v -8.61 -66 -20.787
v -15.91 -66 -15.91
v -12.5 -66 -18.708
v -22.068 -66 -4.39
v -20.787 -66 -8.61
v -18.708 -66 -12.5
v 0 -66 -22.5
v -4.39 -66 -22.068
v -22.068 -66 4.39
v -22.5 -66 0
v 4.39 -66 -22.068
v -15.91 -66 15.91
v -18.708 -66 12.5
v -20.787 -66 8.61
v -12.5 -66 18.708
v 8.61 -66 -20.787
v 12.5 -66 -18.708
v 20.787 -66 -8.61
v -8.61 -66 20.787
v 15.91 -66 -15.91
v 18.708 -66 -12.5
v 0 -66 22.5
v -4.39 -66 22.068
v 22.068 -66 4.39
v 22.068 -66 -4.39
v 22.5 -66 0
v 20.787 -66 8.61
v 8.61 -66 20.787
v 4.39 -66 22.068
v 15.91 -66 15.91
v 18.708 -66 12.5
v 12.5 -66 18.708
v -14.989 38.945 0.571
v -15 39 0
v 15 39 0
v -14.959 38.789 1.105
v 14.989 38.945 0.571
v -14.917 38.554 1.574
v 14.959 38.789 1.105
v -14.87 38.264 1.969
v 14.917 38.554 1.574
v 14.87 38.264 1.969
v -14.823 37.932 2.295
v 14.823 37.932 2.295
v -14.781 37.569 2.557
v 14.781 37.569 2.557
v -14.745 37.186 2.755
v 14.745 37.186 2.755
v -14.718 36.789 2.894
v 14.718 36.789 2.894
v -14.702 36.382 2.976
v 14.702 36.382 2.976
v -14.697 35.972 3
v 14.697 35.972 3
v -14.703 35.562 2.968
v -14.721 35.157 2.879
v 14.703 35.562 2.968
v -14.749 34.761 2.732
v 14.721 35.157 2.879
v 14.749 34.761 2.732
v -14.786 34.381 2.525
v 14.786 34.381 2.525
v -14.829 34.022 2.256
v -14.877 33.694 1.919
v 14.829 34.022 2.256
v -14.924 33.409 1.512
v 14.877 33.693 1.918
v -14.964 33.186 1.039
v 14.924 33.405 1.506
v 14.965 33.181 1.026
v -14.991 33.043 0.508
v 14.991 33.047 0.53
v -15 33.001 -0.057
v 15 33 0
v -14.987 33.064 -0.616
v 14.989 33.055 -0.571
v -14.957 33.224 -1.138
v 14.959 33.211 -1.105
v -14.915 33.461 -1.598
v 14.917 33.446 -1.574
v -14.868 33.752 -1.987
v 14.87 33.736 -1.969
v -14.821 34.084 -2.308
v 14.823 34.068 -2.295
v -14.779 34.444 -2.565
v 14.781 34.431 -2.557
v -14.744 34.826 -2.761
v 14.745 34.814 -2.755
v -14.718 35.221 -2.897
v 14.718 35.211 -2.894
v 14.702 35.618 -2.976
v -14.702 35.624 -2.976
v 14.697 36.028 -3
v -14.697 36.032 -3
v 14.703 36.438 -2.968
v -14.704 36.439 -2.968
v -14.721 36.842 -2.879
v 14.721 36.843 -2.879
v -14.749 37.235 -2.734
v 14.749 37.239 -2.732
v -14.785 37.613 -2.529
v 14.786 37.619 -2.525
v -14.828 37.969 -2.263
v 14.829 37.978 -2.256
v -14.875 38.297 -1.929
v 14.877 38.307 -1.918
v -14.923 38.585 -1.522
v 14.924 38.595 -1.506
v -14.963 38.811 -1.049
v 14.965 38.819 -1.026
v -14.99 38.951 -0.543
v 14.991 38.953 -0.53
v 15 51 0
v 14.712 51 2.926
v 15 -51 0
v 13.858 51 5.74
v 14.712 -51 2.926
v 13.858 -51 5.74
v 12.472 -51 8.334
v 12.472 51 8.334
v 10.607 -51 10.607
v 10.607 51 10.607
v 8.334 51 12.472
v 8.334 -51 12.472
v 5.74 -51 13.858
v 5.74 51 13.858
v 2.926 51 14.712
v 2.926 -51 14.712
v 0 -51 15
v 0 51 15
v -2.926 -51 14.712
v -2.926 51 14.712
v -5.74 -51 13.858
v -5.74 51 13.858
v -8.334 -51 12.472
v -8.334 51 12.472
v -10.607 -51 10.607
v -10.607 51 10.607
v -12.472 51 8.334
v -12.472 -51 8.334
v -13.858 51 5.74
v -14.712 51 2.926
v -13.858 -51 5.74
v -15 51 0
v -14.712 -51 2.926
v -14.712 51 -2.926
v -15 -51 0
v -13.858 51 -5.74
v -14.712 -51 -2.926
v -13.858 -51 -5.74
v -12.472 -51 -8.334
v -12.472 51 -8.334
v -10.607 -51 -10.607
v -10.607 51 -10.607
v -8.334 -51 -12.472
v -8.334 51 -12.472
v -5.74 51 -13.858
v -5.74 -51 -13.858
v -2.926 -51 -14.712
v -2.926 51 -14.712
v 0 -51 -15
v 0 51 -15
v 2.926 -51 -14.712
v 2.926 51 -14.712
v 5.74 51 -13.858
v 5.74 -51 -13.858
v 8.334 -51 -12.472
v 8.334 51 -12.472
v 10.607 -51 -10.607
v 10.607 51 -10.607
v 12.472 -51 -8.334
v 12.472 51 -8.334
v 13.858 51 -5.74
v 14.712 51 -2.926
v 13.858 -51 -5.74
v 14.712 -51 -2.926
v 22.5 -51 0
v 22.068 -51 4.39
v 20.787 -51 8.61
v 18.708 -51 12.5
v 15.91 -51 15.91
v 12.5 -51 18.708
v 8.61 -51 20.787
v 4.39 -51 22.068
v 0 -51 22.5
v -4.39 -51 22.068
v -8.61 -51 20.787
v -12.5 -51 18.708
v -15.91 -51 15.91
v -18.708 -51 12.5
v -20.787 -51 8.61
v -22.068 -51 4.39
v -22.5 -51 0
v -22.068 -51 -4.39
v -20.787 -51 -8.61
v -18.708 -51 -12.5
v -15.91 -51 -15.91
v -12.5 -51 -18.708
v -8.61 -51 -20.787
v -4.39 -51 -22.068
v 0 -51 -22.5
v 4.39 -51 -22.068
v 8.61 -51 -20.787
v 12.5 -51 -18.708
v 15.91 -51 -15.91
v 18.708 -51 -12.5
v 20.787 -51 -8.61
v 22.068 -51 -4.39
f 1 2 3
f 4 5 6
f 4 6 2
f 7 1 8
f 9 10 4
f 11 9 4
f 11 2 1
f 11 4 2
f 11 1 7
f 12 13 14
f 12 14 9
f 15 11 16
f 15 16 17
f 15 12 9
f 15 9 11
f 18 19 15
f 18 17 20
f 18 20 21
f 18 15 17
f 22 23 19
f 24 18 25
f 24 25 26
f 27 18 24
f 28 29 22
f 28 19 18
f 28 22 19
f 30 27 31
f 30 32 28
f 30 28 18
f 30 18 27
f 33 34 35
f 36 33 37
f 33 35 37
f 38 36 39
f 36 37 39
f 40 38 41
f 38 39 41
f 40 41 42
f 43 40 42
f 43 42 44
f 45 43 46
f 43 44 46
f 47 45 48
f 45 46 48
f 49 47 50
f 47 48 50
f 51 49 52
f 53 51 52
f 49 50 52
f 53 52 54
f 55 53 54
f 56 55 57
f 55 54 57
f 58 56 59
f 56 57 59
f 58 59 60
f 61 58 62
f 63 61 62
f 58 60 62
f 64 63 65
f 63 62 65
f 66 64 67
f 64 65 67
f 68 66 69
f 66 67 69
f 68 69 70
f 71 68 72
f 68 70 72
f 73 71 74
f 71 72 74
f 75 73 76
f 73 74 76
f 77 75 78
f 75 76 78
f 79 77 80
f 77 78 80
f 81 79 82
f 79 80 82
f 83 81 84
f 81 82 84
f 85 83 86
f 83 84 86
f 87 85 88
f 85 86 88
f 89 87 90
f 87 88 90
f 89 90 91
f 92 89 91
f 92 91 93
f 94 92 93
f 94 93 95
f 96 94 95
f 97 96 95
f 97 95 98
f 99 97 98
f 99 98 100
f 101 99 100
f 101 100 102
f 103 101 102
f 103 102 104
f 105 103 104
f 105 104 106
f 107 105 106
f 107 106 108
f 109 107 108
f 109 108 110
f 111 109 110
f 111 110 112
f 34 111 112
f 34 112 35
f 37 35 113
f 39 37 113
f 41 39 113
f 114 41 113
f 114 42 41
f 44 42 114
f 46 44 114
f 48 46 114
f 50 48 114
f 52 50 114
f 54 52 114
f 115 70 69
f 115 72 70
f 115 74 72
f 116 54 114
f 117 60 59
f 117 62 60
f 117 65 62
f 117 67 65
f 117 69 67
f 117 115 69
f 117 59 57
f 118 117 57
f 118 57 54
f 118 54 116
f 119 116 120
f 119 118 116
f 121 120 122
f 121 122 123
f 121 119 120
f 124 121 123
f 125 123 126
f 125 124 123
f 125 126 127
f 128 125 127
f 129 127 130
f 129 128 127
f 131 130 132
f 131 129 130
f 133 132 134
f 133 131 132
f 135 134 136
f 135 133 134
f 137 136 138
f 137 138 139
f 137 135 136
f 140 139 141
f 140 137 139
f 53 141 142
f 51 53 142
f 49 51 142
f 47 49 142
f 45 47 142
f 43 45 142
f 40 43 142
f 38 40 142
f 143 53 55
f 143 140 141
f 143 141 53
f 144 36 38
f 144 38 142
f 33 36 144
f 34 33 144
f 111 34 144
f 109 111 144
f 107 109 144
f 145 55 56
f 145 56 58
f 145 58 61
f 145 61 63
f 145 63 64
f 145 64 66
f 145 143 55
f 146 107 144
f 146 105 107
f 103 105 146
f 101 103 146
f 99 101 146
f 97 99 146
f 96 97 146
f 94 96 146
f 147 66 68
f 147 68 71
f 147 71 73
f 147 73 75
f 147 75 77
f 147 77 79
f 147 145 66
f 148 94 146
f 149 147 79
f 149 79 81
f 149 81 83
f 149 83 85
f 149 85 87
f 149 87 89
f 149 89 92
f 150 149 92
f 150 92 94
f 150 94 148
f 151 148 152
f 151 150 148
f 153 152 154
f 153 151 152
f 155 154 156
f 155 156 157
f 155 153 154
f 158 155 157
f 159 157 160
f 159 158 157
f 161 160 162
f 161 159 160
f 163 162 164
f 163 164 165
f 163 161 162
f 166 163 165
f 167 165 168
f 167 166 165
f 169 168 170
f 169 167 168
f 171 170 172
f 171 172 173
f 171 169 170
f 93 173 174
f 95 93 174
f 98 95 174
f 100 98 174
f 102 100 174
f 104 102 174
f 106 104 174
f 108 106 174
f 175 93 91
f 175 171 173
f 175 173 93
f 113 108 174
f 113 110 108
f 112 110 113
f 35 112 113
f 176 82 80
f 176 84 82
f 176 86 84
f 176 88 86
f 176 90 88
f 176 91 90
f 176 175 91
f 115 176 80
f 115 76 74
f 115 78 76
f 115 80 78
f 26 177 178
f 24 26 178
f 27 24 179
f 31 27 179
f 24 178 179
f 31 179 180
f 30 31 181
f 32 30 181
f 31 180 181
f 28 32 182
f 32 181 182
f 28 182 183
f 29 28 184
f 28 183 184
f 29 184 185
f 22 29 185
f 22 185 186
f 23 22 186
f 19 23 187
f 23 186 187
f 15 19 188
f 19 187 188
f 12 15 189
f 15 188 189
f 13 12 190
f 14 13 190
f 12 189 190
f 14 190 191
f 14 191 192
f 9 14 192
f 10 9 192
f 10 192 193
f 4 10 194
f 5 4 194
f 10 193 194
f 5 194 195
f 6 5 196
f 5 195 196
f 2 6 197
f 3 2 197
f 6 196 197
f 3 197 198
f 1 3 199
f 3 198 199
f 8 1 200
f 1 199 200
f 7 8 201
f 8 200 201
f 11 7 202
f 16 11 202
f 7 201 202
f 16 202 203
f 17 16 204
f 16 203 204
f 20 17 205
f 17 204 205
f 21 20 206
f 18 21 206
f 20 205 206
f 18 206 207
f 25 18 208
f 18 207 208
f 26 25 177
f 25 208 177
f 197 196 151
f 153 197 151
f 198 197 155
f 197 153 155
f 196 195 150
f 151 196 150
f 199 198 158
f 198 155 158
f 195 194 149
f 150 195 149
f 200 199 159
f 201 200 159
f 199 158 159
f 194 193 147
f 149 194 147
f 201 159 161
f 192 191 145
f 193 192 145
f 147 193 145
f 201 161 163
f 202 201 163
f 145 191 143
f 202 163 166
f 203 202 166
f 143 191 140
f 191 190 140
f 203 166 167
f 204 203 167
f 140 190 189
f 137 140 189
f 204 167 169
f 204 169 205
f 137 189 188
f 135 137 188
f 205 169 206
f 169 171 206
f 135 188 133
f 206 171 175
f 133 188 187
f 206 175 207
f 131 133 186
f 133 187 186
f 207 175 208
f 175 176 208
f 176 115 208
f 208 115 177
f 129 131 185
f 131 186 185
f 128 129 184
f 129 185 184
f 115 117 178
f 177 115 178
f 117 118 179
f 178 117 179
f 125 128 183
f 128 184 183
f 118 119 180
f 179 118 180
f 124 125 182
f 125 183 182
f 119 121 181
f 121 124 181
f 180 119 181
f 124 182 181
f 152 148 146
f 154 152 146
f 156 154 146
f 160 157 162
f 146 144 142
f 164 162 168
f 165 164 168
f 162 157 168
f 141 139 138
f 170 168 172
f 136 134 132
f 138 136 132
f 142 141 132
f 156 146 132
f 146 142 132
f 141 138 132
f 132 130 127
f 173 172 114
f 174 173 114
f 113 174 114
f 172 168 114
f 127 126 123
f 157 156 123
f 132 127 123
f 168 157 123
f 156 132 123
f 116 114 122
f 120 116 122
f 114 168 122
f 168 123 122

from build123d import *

# Parameters (mm, degrees)
F0_R     = 15
F1_DEPTH = 51
F2_R     = 22.5
F3_DEPTH = 15
F4_R     = 3
F5_DEPTH = 15


with BuildPart() as f1:
    # F0 (on Front) → F1 (new body, symmetric)
    with BuildSketch(Plane.XZ):
        Circle(F0_R)
    extrude(amount=F1_DEPTH, both=True)

    # F2 (on face) → F3 (join)
    with BuildSketch(Plane.XZ.offset(51)):
        Circle(F2_R)
    extrude(amount=F3_DEPTH)

    # F4 (on Right) → F5 (cut, symmetric)
    with BuildSketch(Plane.YZ):
        with Locations((36, 0)):
            Circle(F4_R)
    extrude(amount=F5_DEPTH, both=True, mode=Mode.SUBTRACT)


solid = f1.part
